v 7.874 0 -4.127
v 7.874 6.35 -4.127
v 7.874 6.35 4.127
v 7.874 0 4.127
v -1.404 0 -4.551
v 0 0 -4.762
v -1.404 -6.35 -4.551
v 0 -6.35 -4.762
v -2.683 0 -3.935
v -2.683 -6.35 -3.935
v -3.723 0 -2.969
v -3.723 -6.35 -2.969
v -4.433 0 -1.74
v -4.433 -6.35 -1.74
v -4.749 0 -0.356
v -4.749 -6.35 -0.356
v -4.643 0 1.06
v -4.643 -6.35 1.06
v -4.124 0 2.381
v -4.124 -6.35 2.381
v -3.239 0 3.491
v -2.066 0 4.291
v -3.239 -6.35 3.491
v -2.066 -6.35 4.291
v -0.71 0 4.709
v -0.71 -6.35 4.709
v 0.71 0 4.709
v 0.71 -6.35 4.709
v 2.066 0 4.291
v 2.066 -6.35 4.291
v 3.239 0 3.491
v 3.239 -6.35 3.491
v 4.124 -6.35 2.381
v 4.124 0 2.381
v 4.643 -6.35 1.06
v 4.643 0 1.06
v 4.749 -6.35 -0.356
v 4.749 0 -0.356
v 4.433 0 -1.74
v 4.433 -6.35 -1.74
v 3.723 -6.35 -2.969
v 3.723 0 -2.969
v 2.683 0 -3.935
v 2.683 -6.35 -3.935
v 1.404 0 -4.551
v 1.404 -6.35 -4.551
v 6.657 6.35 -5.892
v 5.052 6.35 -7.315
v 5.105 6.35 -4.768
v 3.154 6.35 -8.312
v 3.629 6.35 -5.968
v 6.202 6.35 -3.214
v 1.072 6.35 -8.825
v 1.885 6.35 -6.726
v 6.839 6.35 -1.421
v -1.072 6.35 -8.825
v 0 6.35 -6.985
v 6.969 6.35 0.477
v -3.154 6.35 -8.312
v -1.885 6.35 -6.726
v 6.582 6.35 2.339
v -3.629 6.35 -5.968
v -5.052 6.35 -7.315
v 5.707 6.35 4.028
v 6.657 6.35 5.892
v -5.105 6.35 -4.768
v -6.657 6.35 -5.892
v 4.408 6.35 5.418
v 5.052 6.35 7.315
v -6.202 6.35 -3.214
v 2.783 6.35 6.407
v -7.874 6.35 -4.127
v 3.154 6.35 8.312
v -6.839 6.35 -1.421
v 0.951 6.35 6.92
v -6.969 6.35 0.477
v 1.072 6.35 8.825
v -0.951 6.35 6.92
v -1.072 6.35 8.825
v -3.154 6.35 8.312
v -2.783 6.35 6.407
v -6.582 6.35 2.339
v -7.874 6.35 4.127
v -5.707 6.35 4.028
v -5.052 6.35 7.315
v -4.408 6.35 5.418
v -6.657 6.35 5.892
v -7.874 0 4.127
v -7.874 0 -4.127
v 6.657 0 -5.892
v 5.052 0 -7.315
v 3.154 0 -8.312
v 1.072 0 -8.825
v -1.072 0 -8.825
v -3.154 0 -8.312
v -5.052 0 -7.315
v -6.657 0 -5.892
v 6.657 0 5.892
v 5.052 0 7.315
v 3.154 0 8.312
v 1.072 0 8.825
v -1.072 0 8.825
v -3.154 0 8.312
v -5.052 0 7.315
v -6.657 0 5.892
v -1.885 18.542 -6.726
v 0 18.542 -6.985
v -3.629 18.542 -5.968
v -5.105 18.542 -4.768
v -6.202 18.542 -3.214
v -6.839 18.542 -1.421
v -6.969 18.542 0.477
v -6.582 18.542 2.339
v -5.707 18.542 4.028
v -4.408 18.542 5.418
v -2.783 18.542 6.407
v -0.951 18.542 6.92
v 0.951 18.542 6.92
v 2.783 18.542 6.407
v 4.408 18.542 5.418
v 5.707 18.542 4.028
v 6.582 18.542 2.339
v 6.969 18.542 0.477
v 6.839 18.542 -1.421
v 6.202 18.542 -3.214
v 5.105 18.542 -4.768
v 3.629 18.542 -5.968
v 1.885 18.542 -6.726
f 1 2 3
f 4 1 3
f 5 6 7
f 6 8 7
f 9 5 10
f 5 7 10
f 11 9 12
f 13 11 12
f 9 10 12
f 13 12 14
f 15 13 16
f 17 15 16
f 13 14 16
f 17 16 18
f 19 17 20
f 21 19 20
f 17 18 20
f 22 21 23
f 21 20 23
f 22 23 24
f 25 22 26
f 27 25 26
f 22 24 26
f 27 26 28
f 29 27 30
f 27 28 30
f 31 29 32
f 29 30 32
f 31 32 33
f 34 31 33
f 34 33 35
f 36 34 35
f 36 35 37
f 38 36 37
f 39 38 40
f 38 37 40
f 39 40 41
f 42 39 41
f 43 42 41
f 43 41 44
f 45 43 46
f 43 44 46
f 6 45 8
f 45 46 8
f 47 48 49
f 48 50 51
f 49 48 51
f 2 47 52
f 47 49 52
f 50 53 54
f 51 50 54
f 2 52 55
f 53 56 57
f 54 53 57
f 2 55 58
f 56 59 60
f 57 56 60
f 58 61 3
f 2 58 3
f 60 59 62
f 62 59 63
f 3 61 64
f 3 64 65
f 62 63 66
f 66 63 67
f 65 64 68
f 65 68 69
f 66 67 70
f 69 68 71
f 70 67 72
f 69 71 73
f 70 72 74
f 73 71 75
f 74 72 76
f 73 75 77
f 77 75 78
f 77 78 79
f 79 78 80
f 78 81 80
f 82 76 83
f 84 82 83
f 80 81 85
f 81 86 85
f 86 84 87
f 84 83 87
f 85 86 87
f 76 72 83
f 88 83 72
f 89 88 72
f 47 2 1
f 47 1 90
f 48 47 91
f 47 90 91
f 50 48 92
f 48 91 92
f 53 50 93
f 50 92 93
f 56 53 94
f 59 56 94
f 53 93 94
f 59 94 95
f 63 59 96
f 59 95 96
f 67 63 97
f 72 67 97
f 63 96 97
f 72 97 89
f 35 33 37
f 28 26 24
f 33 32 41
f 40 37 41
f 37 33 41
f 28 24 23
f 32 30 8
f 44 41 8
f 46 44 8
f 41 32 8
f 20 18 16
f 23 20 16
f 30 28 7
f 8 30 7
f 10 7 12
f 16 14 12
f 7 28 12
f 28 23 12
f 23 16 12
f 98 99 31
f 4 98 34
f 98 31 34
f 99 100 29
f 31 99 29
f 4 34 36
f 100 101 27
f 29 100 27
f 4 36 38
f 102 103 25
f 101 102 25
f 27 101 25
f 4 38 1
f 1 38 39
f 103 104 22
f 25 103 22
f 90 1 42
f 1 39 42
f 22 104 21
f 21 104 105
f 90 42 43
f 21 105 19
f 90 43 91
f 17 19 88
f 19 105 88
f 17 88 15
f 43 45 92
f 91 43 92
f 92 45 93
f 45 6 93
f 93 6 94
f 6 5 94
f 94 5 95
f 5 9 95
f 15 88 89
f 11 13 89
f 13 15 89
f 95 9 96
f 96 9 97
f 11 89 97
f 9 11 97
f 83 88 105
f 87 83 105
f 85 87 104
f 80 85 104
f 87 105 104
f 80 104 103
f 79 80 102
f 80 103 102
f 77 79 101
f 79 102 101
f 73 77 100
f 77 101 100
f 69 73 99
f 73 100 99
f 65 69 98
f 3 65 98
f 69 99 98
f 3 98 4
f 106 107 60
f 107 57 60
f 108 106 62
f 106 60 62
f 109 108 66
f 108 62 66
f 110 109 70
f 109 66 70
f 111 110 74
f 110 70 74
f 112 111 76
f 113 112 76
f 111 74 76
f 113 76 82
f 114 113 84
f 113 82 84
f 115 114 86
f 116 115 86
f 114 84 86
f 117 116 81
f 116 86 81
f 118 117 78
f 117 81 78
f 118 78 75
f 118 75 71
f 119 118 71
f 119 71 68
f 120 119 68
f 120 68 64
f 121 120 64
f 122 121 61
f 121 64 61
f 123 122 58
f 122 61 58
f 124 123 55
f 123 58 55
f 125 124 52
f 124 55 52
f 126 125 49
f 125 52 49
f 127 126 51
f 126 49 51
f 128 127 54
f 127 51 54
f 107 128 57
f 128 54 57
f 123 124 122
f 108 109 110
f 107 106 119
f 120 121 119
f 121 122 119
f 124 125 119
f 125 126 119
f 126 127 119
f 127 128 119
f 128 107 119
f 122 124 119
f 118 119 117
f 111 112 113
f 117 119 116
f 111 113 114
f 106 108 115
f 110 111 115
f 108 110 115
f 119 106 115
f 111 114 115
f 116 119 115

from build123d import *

# Parameters (mm, degrees)
CUT_EXTRUDE1_DEPTH = 25.892


with BuildPart() as part:
    # Sketch1 → Revolve1 (revolve)
    with BuildSketch(Plane(origin=(0, 0, 0), x_dir=(0, 0, -1), z_dir=(1, 0, 0))):
        Polygon((0, 0), (0, 18.542), (6.985, 18.542), (6.985, 6.35), (8.89, 6.35), (8.89, 0), (4.7625, 0), (4.7625, -6.35), (0, -6.35), align=None)
    revolve(axis=Axis((0, 0, 0), (0, 1, 0)))

    # Sketch2 → Cut-Extrude1 (cut, through all)
    with BuildSketch(Plane(origin=(0, 18.542, 0), x_dir=(1, 0, 0), z_dir=(0, 1, 0))):
        with BuildLine():
            Line((-7.874, -4.12701151), (-7.874, 4.12701151))
            ThreePointArc((-7.874, 4.12701151), (-8.89, 0), (-7.874, -4.12701151))
        make_face()
        with BuildLine():
            ThreePointArc((8.89, 0), (8.632263898, 2.125116467), (7.874, 4.12701151))
            Line((7.874, 4.12701151), (7.874, -4.12701151))
            ThreePointArc((7.874, -4.12701151), (8.632263898, -2.125116467), (8.89, 0))
        make_face()
    extrude(amount=-CUT_EXTRUDE1_DEPTH, mode=Mode.SUBTRACT)


solid = part.part
